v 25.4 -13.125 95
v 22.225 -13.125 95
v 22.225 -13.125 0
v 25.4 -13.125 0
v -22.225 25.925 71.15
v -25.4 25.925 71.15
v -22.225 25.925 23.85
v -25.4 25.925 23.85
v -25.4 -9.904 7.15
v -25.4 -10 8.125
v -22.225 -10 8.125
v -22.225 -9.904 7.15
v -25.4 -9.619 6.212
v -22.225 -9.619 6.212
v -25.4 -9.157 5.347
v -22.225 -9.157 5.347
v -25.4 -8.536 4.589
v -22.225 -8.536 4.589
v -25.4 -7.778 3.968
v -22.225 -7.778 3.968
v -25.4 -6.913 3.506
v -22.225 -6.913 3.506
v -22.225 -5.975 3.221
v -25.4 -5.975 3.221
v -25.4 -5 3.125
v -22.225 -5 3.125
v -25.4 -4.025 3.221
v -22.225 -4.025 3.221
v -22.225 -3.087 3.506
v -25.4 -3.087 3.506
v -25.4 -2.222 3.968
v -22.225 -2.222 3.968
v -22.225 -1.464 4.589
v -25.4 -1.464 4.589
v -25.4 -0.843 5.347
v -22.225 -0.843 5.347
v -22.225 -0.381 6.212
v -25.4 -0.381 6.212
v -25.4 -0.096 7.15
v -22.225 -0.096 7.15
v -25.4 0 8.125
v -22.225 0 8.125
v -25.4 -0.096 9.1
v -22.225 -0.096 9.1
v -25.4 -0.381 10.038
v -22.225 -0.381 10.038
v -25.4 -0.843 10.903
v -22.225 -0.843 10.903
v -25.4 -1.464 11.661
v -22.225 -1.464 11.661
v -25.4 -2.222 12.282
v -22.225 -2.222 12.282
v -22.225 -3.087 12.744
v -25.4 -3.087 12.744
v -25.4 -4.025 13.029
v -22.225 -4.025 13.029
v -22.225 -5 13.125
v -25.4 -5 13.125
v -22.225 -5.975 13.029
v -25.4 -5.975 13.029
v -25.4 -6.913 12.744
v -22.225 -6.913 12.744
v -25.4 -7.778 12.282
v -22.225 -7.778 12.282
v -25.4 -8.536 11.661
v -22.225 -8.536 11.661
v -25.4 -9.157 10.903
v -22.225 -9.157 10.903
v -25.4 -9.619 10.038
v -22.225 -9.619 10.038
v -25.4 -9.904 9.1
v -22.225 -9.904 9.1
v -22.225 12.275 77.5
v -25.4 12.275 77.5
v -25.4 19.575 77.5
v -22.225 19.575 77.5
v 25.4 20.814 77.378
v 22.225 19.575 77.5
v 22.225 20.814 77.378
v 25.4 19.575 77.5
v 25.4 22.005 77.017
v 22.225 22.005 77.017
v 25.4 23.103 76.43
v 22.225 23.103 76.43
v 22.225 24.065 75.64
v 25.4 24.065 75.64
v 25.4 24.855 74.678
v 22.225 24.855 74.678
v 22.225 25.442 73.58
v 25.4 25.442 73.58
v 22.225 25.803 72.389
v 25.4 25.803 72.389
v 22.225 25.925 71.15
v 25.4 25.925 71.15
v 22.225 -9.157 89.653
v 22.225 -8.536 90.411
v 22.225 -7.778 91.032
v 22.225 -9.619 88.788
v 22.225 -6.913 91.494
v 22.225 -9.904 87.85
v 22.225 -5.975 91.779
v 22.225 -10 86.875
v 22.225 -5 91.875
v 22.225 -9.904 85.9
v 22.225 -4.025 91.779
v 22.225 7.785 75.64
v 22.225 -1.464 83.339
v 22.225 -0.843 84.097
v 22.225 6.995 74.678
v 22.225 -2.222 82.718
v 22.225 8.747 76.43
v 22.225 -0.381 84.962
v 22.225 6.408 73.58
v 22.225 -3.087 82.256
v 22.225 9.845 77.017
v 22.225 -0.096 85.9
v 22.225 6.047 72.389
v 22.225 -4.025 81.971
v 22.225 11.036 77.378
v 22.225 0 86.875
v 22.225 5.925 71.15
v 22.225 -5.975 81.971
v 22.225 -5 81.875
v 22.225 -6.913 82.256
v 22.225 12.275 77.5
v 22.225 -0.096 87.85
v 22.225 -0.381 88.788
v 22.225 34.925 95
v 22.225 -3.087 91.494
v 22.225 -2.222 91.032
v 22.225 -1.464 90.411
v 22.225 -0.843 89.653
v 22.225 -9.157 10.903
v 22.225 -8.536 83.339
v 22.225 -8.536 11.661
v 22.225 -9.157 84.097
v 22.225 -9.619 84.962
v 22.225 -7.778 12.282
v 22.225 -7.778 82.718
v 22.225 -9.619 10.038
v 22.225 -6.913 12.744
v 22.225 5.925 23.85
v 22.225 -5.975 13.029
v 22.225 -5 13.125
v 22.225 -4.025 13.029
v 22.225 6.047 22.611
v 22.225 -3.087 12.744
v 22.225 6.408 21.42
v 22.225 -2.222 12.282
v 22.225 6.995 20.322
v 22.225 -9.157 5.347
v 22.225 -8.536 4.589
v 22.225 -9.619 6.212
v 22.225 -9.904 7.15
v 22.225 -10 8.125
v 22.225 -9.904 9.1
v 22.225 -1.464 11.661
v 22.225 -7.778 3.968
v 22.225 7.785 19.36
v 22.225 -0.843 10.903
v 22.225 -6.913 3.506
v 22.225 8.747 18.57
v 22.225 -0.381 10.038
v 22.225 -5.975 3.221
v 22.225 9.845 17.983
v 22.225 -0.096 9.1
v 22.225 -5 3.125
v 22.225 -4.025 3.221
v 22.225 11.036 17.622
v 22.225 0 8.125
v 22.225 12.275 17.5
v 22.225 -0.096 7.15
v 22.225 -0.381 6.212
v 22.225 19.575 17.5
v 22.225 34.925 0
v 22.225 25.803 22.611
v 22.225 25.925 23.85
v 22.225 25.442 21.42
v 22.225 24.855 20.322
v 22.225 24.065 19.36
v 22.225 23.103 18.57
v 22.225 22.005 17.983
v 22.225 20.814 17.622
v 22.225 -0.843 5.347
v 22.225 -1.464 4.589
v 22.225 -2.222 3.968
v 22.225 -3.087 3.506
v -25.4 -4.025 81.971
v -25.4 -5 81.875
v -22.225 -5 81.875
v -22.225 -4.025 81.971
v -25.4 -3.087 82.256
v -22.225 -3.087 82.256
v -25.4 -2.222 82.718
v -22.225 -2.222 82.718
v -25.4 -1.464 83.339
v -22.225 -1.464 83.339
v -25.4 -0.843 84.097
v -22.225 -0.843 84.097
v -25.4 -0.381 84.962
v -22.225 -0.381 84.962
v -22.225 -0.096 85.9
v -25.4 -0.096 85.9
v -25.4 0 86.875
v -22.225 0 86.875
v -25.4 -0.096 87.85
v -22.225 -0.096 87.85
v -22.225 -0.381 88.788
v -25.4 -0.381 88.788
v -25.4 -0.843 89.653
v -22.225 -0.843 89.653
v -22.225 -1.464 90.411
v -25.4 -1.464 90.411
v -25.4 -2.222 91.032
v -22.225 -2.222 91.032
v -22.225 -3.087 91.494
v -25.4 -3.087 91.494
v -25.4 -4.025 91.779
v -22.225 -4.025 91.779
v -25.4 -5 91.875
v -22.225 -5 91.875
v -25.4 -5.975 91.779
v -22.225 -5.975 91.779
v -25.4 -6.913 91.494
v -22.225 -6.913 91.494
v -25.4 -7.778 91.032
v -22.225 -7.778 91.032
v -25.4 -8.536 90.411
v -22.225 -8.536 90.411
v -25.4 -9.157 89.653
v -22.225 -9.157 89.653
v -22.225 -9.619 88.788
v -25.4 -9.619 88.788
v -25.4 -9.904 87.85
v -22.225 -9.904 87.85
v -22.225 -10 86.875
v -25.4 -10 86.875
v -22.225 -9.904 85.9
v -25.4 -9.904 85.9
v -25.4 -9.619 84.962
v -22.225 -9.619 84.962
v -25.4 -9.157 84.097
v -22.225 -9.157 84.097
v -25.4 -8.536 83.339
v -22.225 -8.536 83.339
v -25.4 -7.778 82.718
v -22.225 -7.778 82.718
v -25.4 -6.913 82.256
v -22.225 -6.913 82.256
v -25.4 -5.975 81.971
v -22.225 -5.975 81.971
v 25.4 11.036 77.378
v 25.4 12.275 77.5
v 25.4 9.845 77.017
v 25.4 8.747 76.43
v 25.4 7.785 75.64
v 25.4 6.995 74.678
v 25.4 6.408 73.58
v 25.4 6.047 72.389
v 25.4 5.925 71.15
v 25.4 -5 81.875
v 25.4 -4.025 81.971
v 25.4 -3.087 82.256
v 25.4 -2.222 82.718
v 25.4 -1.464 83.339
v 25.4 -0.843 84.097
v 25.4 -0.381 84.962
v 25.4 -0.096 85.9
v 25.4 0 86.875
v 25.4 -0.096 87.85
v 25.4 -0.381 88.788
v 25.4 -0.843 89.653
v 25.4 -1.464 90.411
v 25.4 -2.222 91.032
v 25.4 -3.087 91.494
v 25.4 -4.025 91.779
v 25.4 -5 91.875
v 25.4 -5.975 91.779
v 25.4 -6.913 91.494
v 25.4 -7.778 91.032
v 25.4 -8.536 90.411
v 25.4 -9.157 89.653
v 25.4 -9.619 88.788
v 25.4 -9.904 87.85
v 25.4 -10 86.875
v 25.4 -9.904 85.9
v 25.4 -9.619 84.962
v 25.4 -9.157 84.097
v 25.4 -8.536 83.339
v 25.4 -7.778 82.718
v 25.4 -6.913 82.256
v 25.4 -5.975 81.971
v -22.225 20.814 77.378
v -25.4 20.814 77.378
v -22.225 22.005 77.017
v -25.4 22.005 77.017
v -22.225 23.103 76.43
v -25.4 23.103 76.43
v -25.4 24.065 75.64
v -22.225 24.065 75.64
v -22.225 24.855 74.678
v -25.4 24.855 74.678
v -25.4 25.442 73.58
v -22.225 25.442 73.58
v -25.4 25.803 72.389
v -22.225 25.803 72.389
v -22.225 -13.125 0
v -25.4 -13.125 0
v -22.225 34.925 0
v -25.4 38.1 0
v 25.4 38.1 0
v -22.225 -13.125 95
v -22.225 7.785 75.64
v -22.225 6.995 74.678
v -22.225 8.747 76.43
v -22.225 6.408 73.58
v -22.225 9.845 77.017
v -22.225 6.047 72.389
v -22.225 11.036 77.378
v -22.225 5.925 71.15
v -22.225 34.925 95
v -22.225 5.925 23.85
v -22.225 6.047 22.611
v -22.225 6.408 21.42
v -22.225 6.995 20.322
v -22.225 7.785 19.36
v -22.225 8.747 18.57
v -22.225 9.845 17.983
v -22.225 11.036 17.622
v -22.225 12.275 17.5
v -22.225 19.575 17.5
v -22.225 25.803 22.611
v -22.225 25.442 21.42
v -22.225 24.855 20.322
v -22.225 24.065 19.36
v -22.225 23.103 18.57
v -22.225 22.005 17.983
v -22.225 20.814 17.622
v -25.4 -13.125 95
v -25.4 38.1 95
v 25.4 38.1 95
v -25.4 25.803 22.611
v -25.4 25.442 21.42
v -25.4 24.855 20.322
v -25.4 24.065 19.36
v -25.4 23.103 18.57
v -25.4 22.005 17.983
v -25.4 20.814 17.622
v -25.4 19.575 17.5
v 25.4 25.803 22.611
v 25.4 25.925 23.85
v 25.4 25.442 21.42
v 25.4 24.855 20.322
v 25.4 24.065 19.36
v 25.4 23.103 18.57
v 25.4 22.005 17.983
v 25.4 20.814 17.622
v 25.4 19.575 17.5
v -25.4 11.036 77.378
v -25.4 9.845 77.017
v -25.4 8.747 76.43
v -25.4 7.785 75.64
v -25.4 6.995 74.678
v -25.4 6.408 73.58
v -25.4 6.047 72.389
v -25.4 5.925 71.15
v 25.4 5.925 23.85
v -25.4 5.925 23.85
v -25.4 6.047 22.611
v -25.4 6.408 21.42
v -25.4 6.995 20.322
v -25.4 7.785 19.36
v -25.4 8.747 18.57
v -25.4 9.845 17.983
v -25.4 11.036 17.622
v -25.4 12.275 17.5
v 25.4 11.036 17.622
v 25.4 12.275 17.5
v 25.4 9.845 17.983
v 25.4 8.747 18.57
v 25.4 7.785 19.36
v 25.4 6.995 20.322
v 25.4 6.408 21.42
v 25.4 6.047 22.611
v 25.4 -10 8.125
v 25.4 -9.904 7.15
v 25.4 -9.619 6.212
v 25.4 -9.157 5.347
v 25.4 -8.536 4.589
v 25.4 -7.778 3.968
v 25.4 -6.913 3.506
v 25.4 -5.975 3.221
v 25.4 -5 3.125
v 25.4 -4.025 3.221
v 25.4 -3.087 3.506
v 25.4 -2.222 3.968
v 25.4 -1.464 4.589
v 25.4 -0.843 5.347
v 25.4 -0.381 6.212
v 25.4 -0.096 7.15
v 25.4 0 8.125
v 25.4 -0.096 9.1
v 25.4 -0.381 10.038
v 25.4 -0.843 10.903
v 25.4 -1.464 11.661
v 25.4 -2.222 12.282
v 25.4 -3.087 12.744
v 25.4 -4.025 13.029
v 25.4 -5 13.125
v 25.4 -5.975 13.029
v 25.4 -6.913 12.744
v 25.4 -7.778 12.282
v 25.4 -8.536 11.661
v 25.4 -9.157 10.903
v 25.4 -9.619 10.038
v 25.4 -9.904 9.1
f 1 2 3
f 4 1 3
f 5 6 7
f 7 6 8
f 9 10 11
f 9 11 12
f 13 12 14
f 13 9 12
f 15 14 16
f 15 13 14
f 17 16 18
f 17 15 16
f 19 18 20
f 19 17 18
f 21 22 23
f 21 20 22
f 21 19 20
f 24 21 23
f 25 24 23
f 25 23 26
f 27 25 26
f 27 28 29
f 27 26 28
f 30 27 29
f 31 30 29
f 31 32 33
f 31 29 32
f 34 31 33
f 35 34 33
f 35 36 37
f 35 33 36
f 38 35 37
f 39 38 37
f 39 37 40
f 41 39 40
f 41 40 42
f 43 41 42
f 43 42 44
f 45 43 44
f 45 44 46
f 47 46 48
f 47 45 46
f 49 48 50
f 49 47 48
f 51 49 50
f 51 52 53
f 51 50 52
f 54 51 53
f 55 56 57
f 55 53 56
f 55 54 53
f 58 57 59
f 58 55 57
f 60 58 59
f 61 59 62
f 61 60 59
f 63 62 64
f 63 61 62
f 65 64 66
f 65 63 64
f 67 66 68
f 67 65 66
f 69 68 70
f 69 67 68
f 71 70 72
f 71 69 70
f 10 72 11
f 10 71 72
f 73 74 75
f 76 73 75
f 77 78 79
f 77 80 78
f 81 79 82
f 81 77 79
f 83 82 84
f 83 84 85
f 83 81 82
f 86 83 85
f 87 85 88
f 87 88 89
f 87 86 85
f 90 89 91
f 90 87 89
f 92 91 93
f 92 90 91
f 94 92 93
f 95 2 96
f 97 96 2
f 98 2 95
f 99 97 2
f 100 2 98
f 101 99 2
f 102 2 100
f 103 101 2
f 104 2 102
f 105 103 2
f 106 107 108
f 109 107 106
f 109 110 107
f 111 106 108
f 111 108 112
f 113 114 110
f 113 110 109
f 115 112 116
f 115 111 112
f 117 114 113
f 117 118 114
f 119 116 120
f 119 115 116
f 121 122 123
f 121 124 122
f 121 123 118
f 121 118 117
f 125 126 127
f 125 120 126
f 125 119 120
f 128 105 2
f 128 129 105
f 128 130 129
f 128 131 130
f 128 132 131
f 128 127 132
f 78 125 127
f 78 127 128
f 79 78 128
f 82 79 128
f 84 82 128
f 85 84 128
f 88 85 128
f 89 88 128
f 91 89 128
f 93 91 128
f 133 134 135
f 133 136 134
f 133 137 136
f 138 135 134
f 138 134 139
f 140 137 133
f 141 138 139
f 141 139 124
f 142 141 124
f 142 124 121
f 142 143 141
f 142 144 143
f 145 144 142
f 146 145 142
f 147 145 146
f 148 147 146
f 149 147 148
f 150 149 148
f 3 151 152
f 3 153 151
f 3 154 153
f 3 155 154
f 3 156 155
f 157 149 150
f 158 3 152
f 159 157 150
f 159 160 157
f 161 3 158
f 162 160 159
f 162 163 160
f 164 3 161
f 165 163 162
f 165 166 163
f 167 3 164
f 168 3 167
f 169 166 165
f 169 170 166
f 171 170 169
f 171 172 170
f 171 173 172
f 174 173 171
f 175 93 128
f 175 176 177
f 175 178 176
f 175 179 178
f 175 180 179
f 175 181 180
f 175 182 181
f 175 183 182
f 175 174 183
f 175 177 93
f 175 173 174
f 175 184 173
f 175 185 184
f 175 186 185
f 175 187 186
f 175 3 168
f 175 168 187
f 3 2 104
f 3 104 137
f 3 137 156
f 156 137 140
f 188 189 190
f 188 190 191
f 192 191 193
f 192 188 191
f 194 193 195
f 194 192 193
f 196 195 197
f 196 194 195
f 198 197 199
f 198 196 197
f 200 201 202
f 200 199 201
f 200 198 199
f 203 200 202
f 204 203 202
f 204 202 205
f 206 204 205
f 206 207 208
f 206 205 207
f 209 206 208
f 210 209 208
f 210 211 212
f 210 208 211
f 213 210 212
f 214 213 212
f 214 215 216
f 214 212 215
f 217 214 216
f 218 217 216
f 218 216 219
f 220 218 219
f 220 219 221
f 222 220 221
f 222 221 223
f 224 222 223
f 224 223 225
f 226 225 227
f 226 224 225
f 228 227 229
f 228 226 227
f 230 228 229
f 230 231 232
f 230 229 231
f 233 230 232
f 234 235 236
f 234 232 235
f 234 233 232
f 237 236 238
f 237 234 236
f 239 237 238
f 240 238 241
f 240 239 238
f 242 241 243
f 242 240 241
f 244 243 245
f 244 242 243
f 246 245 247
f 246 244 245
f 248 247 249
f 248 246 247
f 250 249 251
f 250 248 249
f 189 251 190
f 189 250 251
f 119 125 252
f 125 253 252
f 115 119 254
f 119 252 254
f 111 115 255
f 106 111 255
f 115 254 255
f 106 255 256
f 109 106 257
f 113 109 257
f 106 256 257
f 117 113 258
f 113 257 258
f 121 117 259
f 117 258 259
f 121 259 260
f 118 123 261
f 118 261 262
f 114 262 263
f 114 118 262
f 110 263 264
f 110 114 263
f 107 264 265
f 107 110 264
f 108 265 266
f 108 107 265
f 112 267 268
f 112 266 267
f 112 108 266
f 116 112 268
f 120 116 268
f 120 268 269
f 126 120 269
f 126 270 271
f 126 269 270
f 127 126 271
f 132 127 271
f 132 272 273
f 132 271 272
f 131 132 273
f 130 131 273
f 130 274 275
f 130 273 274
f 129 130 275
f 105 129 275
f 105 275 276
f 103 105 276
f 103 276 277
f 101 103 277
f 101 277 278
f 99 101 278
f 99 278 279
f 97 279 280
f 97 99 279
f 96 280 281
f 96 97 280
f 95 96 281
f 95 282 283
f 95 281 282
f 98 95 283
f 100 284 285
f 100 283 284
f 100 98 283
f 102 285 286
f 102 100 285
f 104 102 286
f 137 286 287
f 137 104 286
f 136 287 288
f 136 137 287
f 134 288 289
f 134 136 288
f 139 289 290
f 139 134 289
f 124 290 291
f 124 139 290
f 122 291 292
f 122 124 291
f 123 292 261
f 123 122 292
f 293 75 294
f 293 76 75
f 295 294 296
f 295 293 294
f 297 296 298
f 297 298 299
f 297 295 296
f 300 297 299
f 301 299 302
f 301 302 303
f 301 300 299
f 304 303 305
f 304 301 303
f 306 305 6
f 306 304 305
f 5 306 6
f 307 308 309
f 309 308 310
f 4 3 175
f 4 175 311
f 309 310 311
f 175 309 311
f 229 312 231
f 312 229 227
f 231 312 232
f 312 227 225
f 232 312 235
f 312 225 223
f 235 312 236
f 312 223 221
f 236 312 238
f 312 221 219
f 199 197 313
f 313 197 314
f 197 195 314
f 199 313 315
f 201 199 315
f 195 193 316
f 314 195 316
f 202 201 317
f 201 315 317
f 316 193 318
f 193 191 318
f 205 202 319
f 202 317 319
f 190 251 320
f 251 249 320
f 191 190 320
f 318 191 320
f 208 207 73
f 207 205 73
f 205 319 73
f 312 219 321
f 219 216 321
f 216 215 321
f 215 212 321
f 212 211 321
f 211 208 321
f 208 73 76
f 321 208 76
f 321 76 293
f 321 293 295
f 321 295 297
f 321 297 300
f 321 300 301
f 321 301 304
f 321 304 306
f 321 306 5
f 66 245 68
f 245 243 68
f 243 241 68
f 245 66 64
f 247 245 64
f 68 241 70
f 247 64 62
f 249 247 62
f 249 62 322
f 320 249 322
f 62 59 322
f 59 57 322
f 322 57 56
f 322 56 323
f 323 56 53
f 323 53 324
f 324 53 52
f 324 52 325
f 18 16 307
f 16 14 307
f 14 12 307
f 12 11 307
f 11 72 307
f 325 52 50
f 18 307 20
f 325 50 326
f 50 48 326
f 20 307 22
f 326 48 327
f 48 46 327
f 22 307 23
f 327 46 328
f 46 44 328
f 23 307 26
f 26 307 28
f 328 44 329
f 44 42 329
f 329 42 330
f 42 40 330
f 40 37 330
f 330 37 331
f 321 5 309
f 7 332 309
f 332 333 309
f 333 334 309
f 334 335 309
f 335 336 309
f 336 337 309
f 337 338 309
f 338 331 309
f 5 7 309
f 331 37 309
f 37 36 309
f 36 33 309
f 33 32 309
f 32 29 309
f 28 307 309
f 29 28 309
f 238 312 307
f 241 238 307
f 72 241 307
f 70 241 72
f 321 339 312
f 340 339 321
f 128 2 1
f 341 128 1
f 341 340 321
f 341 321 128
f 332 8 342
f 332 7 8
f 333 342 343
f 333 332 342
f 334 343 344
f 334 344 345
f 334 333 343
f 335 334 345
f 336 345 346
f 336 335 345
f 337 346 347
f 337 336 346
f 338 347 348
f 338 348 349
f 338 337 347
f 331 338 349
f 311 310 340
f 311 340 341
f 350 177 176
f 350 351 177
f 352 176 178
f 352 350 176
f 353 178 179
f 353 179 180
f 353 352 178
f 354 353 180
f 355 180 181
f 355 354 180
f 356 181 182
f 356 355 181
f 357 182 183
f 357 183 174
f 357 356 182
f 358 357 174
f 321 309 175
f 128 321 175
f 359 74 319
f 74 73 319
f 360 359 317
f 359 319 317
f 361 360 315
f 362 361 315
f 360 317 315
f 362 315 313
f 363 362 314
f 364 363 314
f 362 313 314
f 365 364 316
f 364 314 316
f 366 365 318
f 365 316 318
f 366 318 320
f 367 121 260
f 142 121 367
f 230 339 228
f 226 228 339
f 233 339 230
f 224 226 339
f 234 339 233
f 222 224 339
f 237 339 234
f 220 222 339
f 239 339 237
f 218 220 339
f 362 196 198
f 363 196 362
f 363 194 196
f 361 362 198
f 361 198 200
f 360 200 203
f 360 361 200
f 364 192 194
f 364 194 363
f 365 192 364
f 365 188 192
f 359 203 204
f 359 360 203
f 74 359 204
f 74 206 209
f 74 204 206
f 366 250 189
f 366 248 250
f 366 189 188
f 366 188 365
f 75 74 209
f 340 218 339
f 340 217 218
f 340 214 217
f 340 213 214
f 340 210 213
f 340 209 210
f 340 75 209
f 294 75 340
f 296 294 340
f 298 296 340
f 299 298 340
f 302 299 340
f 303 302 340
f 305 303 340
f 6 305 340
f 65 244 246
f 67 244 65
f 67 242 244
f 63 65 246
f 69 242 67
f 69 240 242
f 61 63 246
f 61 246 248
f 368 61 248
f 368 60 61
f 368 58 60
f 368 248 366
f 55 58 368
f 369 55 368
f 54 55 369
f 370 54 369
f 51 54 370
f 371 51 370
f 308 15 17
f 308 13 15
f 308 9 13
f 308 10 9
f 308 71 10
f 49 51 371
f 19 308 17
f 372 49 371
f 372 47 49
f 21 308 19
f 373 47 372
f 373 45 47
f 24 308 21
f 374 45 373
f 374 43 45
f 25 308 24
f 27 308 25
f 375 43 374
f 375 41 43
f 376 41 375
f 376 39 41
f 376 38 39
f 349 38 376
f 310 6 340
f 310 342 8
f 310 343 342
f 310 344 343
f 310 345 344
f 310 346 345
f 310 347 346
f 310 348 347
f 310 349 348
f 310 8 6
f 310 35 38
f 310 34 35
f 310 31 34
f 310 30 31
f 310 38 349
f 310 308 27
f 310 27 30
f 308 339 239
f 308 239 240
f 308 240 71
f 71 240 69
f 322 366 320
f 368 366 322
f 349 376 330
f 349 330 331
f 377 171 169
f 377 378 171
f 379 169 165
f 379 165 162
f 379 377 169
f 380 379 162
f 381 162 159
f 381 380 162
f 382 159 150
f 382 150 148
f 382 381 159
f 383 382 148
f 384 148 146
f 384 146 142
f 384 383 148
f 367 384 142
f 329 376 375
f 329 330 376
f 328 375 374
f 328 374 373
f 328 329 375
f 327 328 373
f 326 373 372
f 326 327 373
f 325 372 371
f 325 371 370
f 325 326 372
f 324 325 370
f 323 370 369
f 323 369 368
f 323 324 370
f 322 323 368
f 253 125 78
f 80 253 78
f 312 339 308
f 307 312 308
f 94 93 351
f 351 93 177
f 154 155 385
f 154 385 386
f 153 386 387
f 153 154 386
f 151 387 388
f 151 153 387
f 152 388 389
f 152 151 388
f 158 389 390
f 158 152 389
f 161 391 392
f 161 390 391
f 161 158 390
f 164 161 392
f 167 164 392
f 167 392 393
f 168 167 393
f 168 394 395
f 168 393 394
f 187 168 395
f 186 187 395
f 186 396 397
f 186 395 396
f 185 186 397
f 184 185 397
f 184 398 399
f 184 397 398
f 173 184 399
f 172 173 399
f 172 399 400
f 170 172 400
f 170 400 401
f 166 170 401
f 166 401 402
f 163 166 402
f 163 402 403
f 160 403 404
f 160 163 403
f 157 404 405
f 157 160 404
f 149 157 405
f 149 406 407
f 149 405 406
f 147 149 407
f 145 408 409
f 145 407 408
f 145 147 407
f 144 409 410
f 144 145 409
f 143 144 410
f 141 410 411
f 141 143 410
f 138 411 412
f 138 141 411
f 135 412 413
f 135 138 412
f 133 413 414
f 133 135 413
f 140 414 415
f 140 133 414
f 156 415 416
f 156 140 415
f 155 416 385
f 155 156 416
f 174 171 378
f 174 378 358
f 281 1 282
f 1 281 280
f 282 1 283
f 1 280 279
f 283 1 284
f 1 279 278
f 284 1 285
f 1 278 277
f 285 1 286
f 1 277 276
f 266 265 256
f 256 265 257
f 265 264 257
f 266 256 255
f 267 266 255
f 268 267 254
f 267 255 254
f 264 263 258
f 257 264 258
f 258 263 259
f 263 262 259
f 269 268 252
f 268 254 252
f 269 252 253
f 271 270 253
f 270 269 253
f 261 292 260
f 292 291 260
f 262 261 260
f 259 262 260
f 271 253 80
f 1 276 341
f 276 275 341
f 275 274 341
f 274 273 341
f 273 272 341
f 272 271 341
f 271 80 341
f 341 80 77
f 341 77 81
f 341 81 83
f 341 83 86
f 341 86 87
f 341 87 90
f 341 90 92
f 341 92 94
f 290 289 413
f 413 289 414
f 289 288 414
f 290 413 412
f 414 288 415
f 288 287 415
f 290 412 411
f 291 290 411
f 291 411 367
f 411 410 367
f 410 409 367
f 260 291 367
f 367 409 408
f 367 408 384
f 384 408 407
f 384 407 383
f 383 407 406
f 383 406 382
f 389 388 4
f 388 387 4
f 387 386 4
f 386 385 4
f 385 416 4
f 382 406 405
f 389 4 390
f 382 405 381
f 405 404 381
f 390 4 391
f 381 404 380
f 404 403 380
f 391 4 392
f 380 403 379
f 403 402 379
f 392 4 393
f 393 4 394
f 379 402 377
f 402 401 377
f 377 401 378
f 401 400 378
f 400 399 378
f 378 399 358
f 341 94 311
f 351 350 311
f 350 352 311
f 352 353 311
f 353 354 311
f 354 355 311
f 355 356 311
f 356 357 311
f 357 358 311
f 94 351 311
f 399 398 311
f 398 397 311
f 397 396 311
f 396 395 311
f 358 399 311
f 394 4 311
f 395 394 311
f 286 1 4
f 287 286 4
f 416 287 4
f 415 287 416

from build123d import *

# Parameters (mm, degrees)
SKETCH1_W               = 50.8
SKETCH1_H               = 76.2
SKETCH1_W_2             = 44.45
SKETCH1_H_2             = 69.85
BOSS_EXTRUDE1_DEPTH     = 95
CUT_EXTRUDE2_DEPTH      = 106.459802769
CUT_EXTRUDE2_DEPTH_BACK = 106.459802769
SKETCH3_R               = 5
SKETCH3_W               = 95
SKETCH3_H               = 24.975
SKETCH3_W_2             = 60
SKETCH3_H_2             = 20
FILLET2_R               = 6.35


with BuildPart() as part:
    # Sketch1 → Boss-Extrude1 (new body)
    with BuildSketch(Plane.XY):
        Rectangle(SKETCH1_W, SKETCH1_H)
        Rectangle(SKETCH1_W_2, SKETCH1_H_2, mode=Mode.SUBTRACT)
    extrude(amount=BOSS_EXTRUDE1_DEPTH)

    # Sketch3 → Cut-Extrude2 (cut, two sides: drawn at the far end of the back side and taken through both)
    with BuildSketch(Plane(origin=(0, 0, 0), x_dir=(0, 0, -1), z_dir=(1, 0, 0)).offset(-CUT_EXTRUDE2_DEPTH_BACK)):
        with Locations((-86.875, -5)):
            Circle(SKETCH3_R)
        with Locations(Location((-8.125, -5, 0), (0, 0, 270))):
            Circle(SKETCH3_R)
        with Locations((-47.5, -25.6125)):
            Rectangle(SKETCH3_W, SKETCH3_H)
        with Locations((-47.5, 15.925)):
            Rectangle(SKETCH3_W_2, SKETCH3_H_2)
    extrude(amount=CUT_EXTRUDE2_DEPTH + CUT_EXTRUDE2_DEPTH_BACK, mode=Mode.SUBTRACT)

    # Fillet2
    fillet2_edges = [part.edges().sort_by_distance(p)[0] for p in [
        (-23.8125, 25.925, 17.5),
        (-23.8125, 5.925, 17.5),
        (-23.8125, 5.925, 77.5),
        (-23.8125, 25.925, 77.5),
        (23.8125, 25.925, 17.5),
        (23.8125, 5.925, 17.5),
        (23.8125, 5.925, 77.5),
        (23.8125, 25.925, 77.5),
    ]]
    fillet(fillet2_edges, radius=FILLET2_R)


solid = part.part
